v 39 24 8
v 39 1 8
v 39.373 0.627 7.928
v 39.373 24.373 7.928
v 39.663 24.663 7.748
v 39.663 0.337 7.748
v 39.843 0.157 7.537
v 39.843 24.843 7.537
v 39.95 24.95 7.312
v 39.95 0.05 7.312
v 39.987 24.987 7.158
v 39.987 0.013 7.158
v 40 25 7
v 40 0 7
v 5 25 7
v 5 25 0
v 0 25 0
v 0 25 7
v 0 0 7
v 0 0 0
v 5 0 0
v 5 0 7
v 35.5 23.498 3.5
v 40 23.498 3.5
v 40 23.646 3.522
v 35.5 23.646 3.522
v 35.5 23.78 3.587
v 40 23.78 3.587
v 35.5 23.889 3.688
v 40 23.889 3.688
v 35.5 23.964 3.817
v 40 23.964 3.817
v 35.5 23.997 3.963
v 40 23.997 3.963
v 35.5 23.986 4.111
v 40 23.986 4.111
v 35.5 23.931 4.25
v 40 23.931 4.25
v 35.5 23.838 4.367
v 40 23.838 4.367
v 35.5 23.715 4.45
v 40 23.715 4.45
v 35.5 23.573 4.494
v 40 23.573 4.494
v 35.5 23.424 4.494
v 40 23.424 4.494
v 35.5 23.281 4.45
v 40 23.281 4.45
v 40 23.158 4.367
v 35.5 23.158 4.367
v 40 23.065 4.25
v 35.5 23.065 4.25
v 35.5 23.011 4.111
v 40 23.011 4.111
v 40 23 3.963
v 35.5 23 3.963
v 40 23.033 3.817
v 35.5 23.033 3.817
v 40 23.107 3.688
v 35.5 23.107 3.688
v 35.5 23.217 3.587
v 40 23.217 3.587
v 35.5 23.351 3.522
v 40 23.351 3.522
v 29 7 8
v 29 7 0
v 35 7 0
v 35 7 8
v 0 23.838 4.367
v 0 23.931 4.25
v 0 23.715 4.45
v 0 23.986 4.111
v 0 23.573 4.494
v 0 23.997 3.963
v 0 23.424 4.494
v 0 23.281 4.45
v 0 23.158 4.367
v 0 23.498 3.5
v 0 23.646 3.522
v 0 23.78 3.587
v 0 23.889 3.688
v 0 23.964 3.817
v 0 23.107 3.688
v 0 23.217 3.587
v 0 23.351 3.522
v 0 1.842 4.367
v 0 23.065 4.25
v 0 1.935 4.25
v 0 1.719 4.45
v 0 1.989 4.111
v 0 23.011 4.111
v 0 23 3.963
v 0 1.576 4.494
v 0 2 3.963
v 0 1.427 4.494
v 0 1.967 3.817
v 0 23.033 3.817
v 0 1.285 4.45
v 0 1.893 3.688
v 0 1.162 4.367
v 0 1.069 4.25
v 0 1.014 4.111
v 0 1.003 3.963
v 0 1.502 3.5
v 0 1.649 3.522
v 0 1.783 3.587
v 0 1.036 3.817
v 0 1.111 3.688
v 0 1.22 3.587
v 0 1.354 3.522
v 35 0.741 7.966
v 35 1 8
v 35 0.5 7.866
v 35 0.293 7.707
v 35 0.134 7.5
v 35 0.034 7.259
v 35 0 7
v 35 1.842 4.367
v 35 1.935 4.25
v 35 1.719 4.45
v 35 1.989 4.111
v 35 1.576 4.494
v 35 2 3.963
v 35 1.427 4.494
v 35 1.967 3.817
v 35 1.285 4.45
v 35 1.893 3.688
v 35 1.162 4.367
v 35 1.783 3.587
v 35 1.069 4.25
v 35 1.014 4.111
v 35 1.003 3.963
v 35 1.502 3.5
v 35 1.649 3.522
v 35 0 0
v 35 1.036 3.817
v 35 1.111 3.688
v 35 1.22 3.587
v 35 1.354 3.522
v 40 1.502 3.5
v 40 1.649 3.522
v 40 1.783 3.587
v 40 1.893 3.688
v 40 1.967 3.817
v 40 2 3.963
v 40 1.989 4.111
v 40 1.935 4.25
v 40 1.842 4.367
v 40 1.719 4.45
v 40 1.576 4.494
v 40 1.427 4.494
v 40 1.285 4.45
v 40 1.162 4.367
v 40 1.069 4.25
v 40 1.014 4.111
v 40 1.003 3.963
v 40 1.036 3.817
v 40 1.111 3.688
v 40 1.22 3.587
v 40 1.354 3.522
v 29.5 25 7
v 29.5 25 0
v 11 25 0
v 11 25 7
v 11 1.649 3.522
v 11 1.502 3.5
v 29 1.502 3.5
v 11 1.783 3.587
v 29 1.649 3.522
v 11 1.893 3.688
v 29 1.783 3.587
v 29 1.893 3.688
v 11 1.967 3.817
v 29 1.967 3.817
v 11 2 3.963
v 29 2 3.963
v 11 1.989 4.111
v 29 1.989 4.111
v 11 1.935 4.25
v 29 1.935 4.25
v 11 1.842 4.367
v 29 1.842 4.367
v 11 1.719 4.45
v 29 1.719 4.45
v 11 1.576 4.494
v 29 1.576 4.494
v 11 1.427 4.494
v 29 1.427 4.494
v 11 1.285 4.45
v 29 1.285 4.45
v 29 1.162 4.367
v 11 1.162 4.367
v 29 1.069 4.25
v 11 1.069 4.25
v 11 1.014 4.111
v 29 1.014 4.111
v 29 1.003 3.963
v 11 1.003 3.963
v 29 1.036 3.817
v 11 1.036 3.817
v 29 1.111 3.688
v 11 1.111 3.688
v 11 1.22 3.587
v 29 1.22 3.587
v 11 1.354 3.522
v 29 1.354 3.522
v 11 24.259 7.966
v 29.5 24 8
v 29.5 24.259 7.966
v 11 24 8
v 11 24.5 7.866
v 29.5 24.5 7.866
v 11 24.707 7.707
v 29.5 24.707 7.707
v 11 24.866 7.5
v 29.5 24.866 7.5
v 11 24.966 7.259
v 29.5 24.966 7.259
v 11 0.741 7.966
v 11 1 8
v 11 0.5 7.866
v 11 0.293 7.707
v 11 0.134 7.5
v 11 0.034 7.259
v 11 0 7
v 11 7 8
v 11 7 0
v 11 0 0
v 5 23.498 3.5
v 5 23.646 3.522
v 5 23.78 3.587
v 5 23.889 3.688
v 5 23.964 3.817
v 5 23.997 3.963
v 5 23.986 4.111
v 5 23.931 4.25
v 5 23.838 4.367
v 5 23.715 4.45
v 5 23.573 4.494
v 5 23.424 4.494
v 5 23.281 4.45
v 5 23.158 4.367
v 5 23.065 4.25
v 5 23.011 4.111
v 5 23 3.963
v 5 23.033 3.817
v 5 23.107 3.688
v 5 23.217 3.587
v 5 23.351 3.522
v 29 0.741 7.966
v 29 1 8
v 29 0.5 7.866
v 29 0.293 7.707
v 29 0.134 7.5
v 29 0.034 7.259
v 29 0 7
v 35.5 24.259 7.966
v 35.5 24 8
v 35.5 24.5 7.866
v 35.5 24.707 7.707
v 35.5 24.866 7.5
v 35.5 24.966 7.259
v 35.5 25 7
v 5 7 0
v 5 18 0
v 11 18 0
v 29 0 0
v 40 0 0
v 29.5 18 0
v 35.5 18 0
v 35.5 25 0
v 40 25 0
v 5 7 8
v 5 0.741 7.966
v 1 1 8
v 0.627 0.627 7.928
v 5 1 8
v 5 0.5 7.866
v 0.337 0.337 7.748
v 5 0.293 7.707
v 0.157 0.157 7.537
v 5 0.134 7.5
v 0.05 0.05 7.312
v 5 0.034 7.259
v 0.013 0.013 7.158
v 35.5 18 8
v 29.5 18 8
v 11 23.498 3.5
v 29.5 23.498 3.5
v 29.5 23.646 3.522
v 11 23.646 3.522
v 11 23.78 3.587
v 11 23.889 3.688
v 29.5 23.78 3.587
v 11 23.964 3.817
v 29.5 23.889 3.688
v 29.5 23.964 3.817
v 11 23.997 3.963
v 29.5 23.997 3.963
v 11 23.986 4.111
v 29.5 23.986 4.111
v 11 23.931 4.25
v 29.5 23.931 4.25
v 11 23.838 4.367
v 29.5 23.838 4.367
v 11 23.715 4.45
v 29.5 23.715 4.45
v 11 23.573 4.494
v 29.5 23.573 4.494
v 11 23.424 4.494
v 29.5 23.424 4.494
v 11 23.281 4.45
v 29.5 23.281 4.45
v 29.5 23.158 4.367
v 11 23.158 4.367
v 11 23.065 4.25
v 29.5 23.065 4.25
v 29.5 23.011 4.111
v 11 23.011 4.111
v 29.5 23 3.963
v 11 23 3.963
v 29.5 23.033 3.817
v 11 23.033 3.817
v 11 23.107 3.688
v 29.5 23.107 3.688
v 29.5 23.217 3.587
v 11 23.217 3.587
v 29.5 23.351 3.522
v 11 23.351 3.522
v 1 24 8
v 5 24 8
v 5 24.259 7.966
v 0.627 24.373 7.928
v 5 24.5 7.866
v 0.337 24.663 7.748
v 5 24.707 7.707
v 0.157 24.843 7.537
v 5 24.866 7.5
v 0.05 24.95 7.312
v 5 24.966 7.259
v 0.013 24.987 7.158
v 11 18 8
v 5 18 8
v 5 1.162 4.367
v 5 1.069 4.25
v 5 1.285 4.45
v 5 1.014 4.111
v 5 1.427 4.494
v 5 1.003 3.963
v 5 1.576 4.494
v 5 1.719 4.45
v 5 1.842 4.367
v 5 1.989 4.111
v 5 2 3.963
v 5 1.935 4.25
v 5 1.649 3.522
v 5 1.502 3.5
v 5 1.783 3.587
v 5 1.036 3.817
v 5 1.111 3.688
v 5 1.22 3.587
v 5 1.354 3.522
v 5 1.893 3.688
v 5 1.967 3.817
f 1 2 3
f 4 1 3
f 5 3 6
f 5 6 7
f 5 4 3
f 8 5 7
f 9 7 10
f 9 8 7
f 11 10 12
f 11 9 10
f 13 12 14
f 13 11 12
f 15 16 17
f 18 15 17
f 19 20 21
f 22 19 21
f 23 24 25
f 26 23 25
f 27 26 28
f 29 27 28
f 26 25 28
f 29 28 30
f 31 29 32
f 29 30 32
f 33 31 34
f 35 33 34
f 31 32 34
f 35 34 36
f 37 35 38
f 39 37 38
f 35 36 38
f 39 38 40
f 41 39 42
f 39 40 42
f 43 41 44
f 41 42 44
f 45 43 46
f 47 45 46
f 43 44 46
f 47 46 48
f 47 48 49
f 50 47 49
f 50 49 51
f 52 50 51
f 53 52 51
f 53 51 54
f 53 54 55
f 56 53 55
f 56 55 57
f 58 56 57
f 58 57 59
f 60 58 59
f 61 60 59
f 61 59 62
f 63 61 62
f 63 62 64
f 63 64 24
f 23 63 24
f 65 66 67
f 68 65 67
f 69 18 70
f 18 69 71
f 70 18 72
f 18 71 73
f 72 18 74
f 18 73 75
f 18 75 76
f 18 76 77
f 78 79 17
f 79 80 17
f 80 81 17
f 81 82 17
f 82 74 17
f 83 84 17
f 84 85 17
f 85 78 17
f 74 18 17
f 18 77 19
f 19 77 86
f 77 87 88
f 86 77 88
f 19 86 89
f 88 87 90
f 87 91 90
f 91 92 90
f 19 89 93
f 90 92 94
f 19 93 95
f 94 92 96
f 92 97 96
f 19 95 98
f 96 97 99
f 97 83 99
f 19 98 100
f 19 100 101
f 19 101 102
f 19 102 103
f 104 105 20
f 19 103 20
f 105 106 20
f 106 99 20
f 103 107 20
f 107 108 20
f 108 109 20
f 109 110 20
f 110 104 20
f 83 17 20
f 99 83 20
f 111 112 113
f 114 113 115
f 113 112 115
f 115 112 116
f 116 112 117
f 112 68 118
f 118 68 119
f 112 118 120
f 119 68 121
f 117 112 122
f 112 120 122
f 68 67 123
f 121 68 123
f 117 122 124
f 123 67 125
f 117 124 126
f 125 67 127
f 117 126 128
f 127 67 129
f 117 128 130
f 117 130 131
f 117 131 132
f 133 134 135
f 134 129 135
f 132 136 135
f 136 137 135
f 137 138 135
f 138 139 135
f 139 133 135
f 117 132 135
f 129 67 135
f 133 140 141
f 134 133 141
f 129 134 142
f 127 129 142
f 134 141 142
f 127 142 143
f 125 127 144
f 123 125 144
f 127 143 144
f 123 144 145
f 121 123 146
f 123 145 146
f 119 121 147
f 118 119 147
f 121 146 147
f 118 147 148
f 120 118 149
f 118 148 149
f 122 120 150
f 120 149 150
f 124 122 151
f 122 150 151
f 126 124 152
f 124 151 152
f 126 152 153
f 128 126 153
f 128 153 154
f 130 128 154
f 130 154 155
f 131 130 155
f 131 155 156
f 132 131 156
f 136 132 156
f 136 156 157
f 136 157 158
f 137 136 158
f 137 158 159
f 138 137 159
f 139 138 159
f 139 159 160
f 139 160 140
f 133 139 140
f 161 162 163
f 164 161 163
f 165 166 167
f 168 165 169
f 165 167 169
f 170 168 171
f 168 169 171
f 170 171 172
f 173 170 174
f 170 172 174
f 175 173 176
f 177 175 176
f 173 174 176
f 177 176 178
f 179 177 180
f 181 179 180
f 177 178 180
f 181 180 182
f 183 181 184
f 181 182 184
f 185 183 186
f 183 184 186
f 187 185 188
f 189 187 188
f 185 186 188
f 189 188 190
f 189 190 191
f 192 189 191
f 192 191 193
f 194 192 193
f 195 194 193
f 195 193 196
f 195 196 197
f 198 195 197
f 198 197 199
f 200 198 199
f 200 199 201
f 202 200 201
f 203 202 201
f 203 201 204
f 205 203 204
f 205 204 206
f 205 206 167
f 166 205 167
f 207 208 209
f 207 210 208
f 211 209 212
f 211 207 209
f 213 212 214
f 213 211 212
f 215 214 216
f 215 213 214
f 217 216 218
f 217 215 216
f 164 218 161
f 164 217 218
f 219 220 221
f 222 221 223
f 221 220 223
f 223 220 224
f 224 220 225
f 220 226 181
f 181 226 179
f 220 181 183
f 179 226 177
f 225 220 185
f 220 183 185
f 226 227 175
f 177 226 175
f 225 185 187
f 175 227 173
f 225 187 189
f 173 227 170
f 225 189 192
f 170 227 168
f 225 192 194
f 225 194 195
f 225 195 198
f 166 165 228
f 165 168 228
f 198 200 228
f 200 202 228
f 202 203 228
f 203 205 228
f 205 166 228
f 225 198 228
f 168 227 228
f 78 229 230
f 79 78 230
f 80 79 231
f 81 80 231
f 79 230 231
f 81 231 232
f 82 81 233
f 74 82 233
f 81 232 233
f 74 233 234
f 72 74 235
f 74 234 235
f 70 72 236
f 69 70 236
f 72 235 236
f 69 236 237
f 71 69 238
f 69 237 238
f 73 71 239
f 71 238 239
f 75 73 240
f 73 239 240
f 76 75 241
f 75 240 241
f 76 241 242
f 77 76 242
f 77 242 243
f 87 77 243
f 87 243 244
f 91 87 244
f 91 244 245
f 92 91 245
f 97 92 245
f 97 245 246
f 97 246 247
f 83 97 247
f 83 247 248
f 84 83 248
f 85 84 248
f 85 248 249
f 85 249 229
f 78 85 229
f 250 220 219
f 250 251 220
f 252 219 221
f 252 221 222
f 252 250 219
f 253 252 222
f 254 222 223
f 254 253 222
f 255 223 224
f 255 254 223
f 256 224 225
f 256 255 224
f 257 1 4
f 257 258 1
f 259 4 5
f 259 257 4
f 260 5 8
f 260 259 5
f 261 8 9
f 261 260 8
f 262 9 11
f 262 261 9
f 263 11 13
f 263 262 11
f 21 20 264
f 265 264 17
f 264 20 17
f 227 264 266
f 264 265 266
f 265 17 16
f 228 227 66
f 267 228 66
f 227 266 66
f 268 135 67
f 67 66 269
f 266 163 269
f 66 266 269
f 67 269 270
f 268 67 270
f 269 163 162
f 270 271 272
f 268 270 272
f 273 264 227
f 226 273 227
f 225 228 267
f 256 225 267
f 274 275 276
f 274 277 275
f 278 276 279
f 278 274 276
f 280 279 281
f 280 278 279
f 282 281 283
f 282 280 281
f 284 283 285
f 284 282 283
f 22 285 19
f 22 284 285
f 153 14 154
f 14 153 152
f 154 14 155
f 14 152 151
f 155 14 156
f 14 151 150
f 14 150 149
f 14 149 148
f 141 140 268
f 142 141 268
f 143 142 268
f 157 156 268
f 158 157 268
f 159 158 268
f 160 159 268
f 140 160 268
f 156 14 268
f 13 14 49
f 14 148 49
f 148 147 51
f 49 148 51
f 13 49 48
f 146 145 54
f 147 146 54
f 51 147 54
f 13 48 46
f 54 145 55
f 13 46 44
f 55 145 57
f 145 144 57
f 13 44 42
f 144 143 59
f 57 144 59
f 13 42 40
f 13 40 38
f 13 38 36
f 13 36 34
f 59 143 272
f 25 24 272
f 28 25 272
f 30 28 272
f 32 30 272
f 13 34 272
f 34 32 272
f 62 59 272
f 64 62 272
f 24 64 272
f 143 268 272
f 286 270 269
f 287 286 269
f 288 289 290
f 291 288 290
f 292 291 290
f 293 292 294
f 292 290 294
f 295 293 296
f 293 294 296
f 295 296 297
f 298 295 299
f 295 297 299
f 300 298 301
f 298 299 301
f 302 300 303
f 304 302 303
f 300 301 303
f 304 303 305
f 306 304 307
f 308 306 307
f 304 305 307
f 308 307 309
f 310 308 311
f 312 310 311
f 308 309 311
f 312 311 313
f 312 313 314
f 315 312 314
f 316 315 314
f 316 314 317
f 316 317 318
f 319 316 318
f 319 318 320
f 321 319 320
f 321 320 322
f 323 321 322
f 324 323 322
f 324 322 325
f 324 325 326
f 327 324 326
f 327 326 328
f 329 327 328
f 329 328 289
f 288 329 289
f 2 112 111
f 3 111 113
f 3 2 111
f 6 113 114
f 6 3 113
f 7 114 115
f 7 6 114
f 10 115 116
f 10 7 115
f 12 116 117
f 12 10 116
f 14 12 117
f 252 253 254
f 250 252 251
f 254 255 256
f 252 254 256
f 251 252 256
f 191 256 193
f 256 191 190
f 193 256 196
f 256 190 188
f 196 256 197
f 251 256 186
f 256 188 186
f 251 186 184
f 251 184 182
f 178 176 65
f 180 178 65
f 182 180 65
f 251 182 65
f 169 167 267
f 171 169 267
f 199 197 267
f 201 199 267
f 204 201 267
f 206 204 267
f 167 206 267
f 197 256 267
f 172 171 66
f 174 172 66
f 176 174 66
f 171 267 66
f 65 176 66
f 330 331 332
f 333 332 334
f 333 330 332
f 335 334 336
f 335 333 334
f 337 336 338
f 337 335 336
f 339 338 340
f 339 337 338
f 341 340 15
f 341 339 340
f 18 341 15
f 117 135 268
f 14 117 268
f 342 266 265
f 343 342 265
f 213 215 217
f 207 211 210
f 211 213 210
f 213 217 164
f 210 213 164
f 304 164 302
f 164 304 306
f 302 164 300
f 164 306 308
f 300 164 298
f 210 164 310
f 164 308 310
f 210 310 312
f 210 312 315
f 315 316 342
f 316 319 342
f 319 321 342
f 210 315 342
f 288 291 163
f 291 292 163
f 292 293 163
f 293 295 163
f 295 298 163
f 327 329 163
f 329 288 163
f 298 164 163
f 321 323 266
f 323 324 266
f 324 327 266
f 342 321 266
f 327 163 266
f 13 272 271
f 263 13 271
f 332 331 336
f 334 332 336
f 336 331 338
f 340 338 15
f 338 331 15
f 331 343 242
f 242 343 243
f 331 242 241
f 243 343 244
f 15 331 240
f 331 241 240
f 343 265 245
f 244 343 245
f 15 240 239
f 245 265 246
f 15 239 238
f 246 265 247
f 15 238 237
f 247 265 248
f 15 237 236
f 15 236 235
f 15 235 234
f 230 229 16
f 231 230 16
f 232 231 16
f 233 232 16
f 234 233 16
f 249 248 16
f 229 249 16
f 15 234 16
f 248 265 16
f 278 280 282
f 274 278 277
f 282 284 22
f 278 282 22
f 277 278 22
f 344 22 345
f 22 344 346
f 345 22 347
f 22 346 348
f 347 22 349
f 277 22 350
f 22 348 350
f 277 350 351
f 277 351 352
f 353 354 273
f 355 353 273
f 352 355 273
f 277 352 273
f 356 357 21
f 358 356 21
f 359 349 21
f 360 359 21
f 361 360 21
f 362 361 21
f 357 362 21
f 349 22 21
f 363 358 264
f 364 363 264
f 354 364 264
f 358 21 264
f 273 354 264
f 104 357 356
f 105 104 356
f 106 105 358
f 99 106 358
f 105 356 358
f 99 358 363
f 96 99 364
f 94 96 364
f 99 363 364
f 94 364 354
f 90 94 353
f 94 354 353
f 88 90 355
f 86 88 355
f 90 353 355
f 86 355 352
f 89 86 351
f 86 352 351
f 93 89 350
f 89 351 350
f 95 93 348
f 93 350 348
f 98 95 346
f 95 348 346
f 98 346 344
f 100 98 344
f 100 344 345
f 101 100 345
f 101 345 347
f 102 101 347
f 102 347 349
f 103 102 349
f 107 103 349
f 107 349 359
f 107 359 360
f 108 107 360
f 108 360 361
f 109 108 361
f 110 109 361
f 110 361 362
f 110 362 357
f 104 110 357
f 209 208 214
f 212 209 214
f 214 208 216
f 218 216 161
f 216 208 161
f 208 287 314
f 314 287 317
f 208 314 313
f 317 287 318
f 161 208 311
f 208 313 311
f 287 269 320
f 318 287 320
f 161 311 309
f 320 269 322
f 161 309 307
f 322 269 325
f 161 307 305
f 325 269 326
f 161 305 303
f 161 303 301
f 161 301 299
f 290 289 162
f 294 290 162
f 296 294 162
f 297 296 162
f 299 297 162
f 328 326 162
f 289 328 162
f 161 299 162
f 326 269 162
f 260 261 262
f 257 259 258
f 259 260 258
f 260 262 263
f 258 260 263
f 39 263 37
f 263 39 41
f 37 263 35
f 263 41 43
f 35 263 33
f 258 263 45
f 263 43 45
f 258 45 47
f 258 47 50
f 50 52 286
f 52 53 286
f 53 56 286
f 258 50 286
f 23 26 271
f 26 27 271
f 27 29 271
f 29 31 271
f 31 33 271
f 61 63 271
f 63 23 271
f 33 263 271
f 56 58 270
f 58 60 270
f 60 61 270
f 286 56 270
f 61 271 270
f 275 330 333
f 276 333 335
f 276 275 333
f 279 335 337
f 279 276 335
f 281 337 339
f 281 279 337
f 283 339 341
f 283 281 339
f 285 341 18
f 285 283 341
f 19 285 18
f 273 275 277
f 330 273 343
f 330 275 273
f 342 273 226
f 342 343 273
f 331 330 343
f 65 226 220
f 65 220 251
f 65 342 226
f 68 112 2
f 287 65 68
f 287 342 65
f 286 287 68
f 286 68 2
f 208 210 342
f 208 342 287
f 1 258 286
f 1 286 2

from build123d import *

# Parameters (mm, degrees)
SALIENTE_EXTRUIR2_DEPTH = 8
CROQUIS3_R              = 0.5
CORTAR_EXTRUIR1_DEPTH   = 45
REDONDEO1_R             = 1
REDONDEO2_R             = 1
REDONDEO3_R             = 1
REDONDEO4_R             = 1


with BuildPart() as part:
    # Croquis1 → Saliente-Extruir2 (new body)
    with BuildSketch(Plane.XY):
        Polygon((0, 0), (5, 0), (5, 7), (11, 7), (11, 0), (29, 0), (29, 7), (35, 7), (35, 0), (40, 0), (40, 25), (35.5, 25), (35.5, 18), (29.5, 18), (29.5, 25), (11, 25), (11, 18), (5, 18), (5, 25), (0, 25), align=None)
    extrude(amount=SALIENTE_EXTRUIR2_DEPTH)

    # Croquis3 → Cortar-Extruir1 (cut)
    with BuildSketch(Plane(origin=(40, 0, 0), x_dir=(0, 0, -1), z_dir=(1, 0, 0))):
        with Locations((-4, 23.498247599)):
            Circle(CROQUIS3_R)
        with Locations((-4, 1.501752401)):
            Circle(CROQUIS3_R)
    extrude(amount=-CORTAR_EXTRUIR1_DEPTH, mode=Mode.SUBTRACT)

    # Redondeo1
    redondeo1_edges = [part.edges().sort_by_distance(p)[0] for p in [
        (20, 0, 8),
    ]]
    fillet(redondeo1_edges, radius=REDONDEO1_R)

    # Redondeo2
    redondeo2_edges = [part.edges().sort_by_distance(p)[0] for p in [
        (37.5, 0, 8),
        (40, 12.5, 8),
        (37.75, 25, 8),
    ]]
    fillet(redondeo2_edges, radius=REDONDEO2_R)

    # Redondeo3
    redondeo3_edges = [part.edges().sort_by_distance(p)[0] for p in [
        (20.25, 25, 8),
    ]]
    fillet(redondeo3_edges, radius=REDONDEO3_R)

    # Redondeo4
    redondeo4_edges = [part.edges().sort_by_distance(p)[0] for p in [
        (0, 12.5, 8),
        (2.5, 25, 8),
        (2.5, 0, 8),
    ]]
    fillet(redondeo4_edges, radius=REDONDEO4_R)


solid = part.part
